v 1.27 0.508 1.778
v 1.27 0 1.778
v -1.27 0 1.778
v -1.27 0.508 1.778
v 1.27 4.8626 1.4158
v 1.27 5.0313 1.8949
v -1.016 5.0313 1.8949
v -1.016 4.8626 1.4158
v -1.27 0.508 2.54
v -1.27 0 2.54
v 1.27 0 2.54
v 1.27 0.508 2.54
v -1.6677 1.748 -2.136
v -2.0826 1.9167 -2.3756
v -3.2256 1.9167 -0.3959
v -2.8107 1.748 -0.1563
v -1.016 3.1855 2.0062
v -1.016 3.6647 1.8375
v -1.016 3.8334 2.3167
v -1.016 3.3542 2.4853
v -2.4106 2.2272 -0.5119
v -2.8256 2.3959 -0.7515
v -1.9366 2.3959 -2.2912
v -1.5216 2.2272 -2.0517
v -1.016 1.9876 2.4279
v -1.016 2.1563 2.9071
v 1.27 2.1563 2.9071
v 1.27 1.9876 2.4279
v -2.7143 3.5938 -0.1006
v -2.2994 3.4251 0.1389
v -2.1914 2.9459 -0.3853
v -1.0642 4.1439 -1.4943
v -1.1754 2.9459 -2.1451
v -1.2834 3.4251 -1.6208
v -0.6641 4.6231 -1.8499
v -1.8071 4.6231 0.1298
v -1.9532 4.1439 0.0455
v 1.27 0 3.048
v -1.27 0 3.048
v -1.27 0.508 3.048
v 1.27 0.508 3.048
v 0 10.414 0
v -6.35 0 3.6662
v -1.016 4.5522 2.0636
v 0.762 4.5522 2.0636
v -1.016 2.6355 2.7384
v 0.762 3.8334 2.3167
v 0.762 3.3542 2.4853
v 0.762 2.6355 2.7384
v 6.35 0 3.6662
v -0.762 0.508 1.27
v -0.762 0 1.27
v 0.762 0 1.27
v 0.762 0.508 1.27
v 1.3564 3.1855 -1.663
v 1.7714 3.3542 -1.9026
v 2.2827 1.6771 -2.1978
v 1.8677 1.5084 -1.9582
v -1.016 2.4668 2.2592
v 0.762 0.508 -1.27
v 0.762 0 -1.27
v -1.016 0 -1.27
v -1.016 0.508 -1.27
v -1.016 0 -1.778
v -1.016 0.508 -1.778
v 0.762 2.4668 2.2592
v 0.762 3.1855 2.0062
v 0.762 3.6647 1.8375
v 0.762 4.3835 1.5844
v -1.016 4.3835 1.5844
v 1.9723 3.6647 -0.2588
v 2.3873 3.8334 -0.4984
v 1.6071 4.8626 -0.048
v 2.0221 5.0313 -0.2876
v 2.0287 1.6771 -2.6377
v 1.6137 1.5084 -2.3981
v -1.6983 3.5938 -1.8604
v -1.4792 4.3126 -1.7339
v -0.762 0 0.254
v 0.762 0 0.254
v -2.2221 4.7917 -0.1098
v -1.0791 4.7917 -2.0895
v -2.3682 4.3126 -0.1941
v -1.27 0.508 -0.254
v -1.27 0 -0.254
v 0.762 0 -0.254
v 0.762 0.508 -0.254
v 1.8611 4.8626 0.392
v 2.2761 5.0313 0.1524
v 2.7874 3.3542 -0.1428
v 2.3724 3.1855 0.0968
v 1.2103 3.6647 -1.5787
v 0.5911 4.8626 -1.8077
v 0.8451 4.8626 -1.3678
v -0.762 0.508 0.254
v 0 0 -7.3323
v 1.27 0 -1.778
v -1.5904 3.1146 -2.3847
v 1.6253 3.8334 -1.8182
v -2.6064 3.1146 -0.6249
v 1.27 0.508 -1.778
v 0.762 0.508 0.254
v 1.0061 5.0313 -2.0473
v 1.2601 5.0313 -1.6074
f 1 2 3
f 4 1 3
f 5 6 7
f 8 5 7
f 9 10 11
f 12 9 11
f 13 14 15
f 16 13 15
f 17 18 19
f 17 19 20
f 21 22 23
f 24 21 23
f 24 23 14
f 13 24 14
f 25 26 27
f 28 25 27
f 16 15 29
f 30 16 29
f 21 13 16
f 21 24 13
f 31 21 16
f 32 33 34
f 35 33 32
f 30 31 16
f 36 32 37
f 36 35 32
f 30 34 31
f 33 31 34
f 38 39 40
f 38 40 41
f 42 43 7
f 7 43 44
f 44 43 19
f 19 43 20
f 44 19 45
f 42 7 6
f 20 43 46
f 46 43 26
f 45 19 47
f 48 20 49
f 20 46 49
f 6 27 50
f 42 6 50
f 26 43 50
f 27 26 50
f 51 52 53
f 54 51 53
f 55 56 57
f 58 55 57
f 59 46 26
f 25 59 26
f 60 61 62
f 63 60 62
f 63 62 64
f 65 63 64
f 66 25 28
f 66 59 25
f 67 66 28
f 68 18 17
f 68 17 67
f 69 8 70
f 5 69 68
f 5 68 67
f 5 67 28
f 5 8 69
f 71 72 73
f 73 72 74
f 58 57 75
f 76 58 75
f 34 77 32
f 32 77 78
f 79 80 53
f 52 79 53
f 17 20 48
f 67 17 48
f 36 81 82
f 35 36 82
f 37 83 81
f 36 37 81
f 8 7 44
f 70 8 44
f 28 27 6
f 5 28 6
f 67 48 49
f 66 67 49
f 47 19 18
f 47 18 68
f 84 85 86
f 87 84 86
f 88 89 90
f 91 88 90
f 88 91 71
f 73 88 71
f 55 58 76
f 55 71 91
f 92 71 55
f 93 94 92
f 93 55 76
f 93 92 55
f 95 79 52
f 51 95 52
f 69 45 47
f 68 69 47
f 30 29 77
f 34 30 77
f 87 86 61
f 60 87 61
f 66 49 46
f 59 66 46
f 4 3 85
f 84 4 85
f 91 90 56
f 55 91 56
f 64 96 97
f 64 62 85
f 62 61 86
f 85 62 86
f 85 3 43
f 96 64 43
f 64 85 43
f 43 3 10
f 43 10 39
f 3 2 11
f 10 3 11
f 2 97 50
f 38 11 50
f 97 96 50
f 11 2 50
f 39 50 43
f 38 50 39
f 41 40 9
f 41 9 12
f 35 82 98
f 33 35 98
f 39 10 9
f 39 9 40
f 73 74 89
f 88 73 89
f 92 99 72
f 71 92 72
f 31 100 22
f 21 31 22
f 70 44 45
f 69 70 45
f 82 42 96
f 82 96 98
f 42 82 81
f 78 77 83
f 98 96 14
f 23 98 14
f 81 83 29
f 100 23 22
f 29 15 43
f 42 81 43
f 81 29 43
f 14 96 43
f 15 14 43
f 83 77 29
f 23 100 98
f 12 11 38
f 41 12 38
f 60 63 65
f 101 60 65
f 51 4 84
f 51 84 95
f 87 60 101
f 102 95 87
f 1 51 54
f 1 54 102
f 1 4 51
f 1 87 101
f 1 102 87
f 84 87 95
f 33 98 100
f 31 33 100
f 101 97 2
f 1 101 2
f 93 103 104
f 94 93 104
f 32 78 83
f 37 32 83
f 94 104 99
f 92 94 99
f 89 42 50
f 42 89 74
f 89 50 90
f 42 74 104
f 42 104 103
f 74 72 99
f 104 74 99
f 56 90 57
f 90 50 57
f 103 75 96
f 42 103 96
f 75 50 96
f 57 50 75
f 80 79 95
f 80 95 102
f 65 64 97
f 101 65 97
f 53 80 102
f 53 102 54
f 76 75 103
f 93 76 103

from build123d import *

# Parameters (mm, degrees)
CUT_EXTRUDE1_DEPTH      = 0.508
CUT_EXTRUDE2_DEPTH      = 0.508
CUT_EXTRUDE3_DEPTH      = 0.508
CUT_EXTRUDE4_DEPTH      = 15.231557685
CUT_EXTRUDE4_DEPTH_BACK = 0.508
SKETCH8_W               = 2.54
SKETCH8_H               = 0.508
SKETCH8_W_2             = 1.524
SKETCH8_H_2             = 1.016


with BuildPart() as part:
    # Sketch1 → Loft1 section 0
    with BuildSketch(Plane(origin=(0, 0, 0), x_dir=(1, 0, 0), z_dir=(0, 1, 0)), mode=Mode.PRIVATE) as loft1_s0:
        with BuildLine():
            Line((0, 7.332348419), (-6.35, -3.666174209))
            Line((-6.35, -3.666174209), (6.35, -3.666174209))
            Line((6.35, -3.666174209), (0, 7.332348419))
        make_face()
    loft([Vertex(0, 10.414, 0), loft1_s0.sketch])

    # Sketch4 → Cut-Extrude1 (cut)
    with BuildSketch(Plane(origin=(0, 1.148332745, 3.26191188), x_dir=(1, 0, 0), z_dir=(6.377659034928701e-15, 0.3320665177261577, 0.9432559715184545))):
        Polygon((-1.016, 2.846586297), (-1.016, 2.338586297), (0.762, 2.338586297), (0.762, 1.576586297), (-1.016, 1.576586297), (-1.016, 1.068586297), (1.27, 1.068586297), (1.27, 4.116586297), (-1.016, 4.116586297), (-1.016, 3.608586297), (0.762, 3.608586297), (0.762, 2.846586297), align=None)
    extrude(amount=-CUT_EXTRUDE1_DEPTH, mode=Mode.SUBTRACT)

    # Sketch6 → Cut-Extrude2 (cut)
    with BuildSketch(Plane(origin=(2.824898553, 1.148332745, -1.63095594), x_dir=(-0.4369088483314536, -0.17760522289896655, -0.881797620233062), z_dir=(0.8168836336063492, 0.33206651772616136, -0.47162798575923026))):
        Polygon((0.212388142, 2.939147635), (-1.28435293, 2.652194393), (-1.523480632, 3.899478619), (-2.022394323, 3.803827539), (-1.68761554, 2.057629621), (0.308039223, 2.440233945), (0.642818006, 0.694036027), (1.141731697, 0.789687108), (0.47217413, 4.282082943), (-0.02673956, 4.186431862), align=None)
    extrude(amount=-CUT_EXTRUDE2_DEPTH, mode=Mode.SUBTRACT)

    # Sketch7 → Cut-Extrude3 (cut)
    with BuildSketch(Plane(origin=(-2.824898553, 1.148332745, -1.63095594), x_dir=(-0.43690884833145016, 0.17760522289896236, 0.8817976202330645), z_dir=(-0.8168836336063534, 0.3320665177261578, -0.47162798575922543))):
        Polygon((1.725111937, 3.602196234), (-0.519999671, 4.032626098), (-0.854778454, 2.28642818), (1.140876309, 1.903823857), (0.997399687, 1.155453321), (-0.74879823, 1.490232104), (-0.844449311, 0.991318413), (1.400662297, 0.560888549), (1.73544108, 2.307086467), (-0.260213682, 2.68969079), (-0.116737061, 3.438061326), (1.629460856, 3.103282543), align=None)
    extrude(amount=-CUT_EXTRUDE3_DEPTH, mode=Mode.SUBTRACT)

    # Sketch8 → Cut-Extrude4 (cut, two sides: drawn at the far end of the back side and taken through both)
    # profile 1 of 2: a face of its own
    with BuildSketch(Plane.XZ.offset(-CUT_EXTRUDE4_DEPTH_BACK)):
        with Locations((0, 2.794)):
            Rectangle(SKETCH8_W, SKETCH8_H)
    # profile 2 of 2: a face of its own
    with BuildSketch(Plane.XZ.offset(-CUT_EXTRUDE4_DEPTH_BACK)):
        Polygon((1.27, 1.778), (-1.27, 1.778), (-1.27, -0.254), (0.762, -0.254), (0.762, -1.27), (-1.016, -1.27), (-1.016, -1.778), (1.27, -1.778), align=None)
        with Locations((0, 0.762)):
            Rectangle(SKETCH8_W_2, SKETCH8_H_2, mode=Mode.SUBTRACT)
    extrude(amount=CUT_EXTRUDE4_DEPTH + CUT_EXTRUDE4_DEPTH_BACK, mode=Mode.SUBTRACT)


solid = part.part
